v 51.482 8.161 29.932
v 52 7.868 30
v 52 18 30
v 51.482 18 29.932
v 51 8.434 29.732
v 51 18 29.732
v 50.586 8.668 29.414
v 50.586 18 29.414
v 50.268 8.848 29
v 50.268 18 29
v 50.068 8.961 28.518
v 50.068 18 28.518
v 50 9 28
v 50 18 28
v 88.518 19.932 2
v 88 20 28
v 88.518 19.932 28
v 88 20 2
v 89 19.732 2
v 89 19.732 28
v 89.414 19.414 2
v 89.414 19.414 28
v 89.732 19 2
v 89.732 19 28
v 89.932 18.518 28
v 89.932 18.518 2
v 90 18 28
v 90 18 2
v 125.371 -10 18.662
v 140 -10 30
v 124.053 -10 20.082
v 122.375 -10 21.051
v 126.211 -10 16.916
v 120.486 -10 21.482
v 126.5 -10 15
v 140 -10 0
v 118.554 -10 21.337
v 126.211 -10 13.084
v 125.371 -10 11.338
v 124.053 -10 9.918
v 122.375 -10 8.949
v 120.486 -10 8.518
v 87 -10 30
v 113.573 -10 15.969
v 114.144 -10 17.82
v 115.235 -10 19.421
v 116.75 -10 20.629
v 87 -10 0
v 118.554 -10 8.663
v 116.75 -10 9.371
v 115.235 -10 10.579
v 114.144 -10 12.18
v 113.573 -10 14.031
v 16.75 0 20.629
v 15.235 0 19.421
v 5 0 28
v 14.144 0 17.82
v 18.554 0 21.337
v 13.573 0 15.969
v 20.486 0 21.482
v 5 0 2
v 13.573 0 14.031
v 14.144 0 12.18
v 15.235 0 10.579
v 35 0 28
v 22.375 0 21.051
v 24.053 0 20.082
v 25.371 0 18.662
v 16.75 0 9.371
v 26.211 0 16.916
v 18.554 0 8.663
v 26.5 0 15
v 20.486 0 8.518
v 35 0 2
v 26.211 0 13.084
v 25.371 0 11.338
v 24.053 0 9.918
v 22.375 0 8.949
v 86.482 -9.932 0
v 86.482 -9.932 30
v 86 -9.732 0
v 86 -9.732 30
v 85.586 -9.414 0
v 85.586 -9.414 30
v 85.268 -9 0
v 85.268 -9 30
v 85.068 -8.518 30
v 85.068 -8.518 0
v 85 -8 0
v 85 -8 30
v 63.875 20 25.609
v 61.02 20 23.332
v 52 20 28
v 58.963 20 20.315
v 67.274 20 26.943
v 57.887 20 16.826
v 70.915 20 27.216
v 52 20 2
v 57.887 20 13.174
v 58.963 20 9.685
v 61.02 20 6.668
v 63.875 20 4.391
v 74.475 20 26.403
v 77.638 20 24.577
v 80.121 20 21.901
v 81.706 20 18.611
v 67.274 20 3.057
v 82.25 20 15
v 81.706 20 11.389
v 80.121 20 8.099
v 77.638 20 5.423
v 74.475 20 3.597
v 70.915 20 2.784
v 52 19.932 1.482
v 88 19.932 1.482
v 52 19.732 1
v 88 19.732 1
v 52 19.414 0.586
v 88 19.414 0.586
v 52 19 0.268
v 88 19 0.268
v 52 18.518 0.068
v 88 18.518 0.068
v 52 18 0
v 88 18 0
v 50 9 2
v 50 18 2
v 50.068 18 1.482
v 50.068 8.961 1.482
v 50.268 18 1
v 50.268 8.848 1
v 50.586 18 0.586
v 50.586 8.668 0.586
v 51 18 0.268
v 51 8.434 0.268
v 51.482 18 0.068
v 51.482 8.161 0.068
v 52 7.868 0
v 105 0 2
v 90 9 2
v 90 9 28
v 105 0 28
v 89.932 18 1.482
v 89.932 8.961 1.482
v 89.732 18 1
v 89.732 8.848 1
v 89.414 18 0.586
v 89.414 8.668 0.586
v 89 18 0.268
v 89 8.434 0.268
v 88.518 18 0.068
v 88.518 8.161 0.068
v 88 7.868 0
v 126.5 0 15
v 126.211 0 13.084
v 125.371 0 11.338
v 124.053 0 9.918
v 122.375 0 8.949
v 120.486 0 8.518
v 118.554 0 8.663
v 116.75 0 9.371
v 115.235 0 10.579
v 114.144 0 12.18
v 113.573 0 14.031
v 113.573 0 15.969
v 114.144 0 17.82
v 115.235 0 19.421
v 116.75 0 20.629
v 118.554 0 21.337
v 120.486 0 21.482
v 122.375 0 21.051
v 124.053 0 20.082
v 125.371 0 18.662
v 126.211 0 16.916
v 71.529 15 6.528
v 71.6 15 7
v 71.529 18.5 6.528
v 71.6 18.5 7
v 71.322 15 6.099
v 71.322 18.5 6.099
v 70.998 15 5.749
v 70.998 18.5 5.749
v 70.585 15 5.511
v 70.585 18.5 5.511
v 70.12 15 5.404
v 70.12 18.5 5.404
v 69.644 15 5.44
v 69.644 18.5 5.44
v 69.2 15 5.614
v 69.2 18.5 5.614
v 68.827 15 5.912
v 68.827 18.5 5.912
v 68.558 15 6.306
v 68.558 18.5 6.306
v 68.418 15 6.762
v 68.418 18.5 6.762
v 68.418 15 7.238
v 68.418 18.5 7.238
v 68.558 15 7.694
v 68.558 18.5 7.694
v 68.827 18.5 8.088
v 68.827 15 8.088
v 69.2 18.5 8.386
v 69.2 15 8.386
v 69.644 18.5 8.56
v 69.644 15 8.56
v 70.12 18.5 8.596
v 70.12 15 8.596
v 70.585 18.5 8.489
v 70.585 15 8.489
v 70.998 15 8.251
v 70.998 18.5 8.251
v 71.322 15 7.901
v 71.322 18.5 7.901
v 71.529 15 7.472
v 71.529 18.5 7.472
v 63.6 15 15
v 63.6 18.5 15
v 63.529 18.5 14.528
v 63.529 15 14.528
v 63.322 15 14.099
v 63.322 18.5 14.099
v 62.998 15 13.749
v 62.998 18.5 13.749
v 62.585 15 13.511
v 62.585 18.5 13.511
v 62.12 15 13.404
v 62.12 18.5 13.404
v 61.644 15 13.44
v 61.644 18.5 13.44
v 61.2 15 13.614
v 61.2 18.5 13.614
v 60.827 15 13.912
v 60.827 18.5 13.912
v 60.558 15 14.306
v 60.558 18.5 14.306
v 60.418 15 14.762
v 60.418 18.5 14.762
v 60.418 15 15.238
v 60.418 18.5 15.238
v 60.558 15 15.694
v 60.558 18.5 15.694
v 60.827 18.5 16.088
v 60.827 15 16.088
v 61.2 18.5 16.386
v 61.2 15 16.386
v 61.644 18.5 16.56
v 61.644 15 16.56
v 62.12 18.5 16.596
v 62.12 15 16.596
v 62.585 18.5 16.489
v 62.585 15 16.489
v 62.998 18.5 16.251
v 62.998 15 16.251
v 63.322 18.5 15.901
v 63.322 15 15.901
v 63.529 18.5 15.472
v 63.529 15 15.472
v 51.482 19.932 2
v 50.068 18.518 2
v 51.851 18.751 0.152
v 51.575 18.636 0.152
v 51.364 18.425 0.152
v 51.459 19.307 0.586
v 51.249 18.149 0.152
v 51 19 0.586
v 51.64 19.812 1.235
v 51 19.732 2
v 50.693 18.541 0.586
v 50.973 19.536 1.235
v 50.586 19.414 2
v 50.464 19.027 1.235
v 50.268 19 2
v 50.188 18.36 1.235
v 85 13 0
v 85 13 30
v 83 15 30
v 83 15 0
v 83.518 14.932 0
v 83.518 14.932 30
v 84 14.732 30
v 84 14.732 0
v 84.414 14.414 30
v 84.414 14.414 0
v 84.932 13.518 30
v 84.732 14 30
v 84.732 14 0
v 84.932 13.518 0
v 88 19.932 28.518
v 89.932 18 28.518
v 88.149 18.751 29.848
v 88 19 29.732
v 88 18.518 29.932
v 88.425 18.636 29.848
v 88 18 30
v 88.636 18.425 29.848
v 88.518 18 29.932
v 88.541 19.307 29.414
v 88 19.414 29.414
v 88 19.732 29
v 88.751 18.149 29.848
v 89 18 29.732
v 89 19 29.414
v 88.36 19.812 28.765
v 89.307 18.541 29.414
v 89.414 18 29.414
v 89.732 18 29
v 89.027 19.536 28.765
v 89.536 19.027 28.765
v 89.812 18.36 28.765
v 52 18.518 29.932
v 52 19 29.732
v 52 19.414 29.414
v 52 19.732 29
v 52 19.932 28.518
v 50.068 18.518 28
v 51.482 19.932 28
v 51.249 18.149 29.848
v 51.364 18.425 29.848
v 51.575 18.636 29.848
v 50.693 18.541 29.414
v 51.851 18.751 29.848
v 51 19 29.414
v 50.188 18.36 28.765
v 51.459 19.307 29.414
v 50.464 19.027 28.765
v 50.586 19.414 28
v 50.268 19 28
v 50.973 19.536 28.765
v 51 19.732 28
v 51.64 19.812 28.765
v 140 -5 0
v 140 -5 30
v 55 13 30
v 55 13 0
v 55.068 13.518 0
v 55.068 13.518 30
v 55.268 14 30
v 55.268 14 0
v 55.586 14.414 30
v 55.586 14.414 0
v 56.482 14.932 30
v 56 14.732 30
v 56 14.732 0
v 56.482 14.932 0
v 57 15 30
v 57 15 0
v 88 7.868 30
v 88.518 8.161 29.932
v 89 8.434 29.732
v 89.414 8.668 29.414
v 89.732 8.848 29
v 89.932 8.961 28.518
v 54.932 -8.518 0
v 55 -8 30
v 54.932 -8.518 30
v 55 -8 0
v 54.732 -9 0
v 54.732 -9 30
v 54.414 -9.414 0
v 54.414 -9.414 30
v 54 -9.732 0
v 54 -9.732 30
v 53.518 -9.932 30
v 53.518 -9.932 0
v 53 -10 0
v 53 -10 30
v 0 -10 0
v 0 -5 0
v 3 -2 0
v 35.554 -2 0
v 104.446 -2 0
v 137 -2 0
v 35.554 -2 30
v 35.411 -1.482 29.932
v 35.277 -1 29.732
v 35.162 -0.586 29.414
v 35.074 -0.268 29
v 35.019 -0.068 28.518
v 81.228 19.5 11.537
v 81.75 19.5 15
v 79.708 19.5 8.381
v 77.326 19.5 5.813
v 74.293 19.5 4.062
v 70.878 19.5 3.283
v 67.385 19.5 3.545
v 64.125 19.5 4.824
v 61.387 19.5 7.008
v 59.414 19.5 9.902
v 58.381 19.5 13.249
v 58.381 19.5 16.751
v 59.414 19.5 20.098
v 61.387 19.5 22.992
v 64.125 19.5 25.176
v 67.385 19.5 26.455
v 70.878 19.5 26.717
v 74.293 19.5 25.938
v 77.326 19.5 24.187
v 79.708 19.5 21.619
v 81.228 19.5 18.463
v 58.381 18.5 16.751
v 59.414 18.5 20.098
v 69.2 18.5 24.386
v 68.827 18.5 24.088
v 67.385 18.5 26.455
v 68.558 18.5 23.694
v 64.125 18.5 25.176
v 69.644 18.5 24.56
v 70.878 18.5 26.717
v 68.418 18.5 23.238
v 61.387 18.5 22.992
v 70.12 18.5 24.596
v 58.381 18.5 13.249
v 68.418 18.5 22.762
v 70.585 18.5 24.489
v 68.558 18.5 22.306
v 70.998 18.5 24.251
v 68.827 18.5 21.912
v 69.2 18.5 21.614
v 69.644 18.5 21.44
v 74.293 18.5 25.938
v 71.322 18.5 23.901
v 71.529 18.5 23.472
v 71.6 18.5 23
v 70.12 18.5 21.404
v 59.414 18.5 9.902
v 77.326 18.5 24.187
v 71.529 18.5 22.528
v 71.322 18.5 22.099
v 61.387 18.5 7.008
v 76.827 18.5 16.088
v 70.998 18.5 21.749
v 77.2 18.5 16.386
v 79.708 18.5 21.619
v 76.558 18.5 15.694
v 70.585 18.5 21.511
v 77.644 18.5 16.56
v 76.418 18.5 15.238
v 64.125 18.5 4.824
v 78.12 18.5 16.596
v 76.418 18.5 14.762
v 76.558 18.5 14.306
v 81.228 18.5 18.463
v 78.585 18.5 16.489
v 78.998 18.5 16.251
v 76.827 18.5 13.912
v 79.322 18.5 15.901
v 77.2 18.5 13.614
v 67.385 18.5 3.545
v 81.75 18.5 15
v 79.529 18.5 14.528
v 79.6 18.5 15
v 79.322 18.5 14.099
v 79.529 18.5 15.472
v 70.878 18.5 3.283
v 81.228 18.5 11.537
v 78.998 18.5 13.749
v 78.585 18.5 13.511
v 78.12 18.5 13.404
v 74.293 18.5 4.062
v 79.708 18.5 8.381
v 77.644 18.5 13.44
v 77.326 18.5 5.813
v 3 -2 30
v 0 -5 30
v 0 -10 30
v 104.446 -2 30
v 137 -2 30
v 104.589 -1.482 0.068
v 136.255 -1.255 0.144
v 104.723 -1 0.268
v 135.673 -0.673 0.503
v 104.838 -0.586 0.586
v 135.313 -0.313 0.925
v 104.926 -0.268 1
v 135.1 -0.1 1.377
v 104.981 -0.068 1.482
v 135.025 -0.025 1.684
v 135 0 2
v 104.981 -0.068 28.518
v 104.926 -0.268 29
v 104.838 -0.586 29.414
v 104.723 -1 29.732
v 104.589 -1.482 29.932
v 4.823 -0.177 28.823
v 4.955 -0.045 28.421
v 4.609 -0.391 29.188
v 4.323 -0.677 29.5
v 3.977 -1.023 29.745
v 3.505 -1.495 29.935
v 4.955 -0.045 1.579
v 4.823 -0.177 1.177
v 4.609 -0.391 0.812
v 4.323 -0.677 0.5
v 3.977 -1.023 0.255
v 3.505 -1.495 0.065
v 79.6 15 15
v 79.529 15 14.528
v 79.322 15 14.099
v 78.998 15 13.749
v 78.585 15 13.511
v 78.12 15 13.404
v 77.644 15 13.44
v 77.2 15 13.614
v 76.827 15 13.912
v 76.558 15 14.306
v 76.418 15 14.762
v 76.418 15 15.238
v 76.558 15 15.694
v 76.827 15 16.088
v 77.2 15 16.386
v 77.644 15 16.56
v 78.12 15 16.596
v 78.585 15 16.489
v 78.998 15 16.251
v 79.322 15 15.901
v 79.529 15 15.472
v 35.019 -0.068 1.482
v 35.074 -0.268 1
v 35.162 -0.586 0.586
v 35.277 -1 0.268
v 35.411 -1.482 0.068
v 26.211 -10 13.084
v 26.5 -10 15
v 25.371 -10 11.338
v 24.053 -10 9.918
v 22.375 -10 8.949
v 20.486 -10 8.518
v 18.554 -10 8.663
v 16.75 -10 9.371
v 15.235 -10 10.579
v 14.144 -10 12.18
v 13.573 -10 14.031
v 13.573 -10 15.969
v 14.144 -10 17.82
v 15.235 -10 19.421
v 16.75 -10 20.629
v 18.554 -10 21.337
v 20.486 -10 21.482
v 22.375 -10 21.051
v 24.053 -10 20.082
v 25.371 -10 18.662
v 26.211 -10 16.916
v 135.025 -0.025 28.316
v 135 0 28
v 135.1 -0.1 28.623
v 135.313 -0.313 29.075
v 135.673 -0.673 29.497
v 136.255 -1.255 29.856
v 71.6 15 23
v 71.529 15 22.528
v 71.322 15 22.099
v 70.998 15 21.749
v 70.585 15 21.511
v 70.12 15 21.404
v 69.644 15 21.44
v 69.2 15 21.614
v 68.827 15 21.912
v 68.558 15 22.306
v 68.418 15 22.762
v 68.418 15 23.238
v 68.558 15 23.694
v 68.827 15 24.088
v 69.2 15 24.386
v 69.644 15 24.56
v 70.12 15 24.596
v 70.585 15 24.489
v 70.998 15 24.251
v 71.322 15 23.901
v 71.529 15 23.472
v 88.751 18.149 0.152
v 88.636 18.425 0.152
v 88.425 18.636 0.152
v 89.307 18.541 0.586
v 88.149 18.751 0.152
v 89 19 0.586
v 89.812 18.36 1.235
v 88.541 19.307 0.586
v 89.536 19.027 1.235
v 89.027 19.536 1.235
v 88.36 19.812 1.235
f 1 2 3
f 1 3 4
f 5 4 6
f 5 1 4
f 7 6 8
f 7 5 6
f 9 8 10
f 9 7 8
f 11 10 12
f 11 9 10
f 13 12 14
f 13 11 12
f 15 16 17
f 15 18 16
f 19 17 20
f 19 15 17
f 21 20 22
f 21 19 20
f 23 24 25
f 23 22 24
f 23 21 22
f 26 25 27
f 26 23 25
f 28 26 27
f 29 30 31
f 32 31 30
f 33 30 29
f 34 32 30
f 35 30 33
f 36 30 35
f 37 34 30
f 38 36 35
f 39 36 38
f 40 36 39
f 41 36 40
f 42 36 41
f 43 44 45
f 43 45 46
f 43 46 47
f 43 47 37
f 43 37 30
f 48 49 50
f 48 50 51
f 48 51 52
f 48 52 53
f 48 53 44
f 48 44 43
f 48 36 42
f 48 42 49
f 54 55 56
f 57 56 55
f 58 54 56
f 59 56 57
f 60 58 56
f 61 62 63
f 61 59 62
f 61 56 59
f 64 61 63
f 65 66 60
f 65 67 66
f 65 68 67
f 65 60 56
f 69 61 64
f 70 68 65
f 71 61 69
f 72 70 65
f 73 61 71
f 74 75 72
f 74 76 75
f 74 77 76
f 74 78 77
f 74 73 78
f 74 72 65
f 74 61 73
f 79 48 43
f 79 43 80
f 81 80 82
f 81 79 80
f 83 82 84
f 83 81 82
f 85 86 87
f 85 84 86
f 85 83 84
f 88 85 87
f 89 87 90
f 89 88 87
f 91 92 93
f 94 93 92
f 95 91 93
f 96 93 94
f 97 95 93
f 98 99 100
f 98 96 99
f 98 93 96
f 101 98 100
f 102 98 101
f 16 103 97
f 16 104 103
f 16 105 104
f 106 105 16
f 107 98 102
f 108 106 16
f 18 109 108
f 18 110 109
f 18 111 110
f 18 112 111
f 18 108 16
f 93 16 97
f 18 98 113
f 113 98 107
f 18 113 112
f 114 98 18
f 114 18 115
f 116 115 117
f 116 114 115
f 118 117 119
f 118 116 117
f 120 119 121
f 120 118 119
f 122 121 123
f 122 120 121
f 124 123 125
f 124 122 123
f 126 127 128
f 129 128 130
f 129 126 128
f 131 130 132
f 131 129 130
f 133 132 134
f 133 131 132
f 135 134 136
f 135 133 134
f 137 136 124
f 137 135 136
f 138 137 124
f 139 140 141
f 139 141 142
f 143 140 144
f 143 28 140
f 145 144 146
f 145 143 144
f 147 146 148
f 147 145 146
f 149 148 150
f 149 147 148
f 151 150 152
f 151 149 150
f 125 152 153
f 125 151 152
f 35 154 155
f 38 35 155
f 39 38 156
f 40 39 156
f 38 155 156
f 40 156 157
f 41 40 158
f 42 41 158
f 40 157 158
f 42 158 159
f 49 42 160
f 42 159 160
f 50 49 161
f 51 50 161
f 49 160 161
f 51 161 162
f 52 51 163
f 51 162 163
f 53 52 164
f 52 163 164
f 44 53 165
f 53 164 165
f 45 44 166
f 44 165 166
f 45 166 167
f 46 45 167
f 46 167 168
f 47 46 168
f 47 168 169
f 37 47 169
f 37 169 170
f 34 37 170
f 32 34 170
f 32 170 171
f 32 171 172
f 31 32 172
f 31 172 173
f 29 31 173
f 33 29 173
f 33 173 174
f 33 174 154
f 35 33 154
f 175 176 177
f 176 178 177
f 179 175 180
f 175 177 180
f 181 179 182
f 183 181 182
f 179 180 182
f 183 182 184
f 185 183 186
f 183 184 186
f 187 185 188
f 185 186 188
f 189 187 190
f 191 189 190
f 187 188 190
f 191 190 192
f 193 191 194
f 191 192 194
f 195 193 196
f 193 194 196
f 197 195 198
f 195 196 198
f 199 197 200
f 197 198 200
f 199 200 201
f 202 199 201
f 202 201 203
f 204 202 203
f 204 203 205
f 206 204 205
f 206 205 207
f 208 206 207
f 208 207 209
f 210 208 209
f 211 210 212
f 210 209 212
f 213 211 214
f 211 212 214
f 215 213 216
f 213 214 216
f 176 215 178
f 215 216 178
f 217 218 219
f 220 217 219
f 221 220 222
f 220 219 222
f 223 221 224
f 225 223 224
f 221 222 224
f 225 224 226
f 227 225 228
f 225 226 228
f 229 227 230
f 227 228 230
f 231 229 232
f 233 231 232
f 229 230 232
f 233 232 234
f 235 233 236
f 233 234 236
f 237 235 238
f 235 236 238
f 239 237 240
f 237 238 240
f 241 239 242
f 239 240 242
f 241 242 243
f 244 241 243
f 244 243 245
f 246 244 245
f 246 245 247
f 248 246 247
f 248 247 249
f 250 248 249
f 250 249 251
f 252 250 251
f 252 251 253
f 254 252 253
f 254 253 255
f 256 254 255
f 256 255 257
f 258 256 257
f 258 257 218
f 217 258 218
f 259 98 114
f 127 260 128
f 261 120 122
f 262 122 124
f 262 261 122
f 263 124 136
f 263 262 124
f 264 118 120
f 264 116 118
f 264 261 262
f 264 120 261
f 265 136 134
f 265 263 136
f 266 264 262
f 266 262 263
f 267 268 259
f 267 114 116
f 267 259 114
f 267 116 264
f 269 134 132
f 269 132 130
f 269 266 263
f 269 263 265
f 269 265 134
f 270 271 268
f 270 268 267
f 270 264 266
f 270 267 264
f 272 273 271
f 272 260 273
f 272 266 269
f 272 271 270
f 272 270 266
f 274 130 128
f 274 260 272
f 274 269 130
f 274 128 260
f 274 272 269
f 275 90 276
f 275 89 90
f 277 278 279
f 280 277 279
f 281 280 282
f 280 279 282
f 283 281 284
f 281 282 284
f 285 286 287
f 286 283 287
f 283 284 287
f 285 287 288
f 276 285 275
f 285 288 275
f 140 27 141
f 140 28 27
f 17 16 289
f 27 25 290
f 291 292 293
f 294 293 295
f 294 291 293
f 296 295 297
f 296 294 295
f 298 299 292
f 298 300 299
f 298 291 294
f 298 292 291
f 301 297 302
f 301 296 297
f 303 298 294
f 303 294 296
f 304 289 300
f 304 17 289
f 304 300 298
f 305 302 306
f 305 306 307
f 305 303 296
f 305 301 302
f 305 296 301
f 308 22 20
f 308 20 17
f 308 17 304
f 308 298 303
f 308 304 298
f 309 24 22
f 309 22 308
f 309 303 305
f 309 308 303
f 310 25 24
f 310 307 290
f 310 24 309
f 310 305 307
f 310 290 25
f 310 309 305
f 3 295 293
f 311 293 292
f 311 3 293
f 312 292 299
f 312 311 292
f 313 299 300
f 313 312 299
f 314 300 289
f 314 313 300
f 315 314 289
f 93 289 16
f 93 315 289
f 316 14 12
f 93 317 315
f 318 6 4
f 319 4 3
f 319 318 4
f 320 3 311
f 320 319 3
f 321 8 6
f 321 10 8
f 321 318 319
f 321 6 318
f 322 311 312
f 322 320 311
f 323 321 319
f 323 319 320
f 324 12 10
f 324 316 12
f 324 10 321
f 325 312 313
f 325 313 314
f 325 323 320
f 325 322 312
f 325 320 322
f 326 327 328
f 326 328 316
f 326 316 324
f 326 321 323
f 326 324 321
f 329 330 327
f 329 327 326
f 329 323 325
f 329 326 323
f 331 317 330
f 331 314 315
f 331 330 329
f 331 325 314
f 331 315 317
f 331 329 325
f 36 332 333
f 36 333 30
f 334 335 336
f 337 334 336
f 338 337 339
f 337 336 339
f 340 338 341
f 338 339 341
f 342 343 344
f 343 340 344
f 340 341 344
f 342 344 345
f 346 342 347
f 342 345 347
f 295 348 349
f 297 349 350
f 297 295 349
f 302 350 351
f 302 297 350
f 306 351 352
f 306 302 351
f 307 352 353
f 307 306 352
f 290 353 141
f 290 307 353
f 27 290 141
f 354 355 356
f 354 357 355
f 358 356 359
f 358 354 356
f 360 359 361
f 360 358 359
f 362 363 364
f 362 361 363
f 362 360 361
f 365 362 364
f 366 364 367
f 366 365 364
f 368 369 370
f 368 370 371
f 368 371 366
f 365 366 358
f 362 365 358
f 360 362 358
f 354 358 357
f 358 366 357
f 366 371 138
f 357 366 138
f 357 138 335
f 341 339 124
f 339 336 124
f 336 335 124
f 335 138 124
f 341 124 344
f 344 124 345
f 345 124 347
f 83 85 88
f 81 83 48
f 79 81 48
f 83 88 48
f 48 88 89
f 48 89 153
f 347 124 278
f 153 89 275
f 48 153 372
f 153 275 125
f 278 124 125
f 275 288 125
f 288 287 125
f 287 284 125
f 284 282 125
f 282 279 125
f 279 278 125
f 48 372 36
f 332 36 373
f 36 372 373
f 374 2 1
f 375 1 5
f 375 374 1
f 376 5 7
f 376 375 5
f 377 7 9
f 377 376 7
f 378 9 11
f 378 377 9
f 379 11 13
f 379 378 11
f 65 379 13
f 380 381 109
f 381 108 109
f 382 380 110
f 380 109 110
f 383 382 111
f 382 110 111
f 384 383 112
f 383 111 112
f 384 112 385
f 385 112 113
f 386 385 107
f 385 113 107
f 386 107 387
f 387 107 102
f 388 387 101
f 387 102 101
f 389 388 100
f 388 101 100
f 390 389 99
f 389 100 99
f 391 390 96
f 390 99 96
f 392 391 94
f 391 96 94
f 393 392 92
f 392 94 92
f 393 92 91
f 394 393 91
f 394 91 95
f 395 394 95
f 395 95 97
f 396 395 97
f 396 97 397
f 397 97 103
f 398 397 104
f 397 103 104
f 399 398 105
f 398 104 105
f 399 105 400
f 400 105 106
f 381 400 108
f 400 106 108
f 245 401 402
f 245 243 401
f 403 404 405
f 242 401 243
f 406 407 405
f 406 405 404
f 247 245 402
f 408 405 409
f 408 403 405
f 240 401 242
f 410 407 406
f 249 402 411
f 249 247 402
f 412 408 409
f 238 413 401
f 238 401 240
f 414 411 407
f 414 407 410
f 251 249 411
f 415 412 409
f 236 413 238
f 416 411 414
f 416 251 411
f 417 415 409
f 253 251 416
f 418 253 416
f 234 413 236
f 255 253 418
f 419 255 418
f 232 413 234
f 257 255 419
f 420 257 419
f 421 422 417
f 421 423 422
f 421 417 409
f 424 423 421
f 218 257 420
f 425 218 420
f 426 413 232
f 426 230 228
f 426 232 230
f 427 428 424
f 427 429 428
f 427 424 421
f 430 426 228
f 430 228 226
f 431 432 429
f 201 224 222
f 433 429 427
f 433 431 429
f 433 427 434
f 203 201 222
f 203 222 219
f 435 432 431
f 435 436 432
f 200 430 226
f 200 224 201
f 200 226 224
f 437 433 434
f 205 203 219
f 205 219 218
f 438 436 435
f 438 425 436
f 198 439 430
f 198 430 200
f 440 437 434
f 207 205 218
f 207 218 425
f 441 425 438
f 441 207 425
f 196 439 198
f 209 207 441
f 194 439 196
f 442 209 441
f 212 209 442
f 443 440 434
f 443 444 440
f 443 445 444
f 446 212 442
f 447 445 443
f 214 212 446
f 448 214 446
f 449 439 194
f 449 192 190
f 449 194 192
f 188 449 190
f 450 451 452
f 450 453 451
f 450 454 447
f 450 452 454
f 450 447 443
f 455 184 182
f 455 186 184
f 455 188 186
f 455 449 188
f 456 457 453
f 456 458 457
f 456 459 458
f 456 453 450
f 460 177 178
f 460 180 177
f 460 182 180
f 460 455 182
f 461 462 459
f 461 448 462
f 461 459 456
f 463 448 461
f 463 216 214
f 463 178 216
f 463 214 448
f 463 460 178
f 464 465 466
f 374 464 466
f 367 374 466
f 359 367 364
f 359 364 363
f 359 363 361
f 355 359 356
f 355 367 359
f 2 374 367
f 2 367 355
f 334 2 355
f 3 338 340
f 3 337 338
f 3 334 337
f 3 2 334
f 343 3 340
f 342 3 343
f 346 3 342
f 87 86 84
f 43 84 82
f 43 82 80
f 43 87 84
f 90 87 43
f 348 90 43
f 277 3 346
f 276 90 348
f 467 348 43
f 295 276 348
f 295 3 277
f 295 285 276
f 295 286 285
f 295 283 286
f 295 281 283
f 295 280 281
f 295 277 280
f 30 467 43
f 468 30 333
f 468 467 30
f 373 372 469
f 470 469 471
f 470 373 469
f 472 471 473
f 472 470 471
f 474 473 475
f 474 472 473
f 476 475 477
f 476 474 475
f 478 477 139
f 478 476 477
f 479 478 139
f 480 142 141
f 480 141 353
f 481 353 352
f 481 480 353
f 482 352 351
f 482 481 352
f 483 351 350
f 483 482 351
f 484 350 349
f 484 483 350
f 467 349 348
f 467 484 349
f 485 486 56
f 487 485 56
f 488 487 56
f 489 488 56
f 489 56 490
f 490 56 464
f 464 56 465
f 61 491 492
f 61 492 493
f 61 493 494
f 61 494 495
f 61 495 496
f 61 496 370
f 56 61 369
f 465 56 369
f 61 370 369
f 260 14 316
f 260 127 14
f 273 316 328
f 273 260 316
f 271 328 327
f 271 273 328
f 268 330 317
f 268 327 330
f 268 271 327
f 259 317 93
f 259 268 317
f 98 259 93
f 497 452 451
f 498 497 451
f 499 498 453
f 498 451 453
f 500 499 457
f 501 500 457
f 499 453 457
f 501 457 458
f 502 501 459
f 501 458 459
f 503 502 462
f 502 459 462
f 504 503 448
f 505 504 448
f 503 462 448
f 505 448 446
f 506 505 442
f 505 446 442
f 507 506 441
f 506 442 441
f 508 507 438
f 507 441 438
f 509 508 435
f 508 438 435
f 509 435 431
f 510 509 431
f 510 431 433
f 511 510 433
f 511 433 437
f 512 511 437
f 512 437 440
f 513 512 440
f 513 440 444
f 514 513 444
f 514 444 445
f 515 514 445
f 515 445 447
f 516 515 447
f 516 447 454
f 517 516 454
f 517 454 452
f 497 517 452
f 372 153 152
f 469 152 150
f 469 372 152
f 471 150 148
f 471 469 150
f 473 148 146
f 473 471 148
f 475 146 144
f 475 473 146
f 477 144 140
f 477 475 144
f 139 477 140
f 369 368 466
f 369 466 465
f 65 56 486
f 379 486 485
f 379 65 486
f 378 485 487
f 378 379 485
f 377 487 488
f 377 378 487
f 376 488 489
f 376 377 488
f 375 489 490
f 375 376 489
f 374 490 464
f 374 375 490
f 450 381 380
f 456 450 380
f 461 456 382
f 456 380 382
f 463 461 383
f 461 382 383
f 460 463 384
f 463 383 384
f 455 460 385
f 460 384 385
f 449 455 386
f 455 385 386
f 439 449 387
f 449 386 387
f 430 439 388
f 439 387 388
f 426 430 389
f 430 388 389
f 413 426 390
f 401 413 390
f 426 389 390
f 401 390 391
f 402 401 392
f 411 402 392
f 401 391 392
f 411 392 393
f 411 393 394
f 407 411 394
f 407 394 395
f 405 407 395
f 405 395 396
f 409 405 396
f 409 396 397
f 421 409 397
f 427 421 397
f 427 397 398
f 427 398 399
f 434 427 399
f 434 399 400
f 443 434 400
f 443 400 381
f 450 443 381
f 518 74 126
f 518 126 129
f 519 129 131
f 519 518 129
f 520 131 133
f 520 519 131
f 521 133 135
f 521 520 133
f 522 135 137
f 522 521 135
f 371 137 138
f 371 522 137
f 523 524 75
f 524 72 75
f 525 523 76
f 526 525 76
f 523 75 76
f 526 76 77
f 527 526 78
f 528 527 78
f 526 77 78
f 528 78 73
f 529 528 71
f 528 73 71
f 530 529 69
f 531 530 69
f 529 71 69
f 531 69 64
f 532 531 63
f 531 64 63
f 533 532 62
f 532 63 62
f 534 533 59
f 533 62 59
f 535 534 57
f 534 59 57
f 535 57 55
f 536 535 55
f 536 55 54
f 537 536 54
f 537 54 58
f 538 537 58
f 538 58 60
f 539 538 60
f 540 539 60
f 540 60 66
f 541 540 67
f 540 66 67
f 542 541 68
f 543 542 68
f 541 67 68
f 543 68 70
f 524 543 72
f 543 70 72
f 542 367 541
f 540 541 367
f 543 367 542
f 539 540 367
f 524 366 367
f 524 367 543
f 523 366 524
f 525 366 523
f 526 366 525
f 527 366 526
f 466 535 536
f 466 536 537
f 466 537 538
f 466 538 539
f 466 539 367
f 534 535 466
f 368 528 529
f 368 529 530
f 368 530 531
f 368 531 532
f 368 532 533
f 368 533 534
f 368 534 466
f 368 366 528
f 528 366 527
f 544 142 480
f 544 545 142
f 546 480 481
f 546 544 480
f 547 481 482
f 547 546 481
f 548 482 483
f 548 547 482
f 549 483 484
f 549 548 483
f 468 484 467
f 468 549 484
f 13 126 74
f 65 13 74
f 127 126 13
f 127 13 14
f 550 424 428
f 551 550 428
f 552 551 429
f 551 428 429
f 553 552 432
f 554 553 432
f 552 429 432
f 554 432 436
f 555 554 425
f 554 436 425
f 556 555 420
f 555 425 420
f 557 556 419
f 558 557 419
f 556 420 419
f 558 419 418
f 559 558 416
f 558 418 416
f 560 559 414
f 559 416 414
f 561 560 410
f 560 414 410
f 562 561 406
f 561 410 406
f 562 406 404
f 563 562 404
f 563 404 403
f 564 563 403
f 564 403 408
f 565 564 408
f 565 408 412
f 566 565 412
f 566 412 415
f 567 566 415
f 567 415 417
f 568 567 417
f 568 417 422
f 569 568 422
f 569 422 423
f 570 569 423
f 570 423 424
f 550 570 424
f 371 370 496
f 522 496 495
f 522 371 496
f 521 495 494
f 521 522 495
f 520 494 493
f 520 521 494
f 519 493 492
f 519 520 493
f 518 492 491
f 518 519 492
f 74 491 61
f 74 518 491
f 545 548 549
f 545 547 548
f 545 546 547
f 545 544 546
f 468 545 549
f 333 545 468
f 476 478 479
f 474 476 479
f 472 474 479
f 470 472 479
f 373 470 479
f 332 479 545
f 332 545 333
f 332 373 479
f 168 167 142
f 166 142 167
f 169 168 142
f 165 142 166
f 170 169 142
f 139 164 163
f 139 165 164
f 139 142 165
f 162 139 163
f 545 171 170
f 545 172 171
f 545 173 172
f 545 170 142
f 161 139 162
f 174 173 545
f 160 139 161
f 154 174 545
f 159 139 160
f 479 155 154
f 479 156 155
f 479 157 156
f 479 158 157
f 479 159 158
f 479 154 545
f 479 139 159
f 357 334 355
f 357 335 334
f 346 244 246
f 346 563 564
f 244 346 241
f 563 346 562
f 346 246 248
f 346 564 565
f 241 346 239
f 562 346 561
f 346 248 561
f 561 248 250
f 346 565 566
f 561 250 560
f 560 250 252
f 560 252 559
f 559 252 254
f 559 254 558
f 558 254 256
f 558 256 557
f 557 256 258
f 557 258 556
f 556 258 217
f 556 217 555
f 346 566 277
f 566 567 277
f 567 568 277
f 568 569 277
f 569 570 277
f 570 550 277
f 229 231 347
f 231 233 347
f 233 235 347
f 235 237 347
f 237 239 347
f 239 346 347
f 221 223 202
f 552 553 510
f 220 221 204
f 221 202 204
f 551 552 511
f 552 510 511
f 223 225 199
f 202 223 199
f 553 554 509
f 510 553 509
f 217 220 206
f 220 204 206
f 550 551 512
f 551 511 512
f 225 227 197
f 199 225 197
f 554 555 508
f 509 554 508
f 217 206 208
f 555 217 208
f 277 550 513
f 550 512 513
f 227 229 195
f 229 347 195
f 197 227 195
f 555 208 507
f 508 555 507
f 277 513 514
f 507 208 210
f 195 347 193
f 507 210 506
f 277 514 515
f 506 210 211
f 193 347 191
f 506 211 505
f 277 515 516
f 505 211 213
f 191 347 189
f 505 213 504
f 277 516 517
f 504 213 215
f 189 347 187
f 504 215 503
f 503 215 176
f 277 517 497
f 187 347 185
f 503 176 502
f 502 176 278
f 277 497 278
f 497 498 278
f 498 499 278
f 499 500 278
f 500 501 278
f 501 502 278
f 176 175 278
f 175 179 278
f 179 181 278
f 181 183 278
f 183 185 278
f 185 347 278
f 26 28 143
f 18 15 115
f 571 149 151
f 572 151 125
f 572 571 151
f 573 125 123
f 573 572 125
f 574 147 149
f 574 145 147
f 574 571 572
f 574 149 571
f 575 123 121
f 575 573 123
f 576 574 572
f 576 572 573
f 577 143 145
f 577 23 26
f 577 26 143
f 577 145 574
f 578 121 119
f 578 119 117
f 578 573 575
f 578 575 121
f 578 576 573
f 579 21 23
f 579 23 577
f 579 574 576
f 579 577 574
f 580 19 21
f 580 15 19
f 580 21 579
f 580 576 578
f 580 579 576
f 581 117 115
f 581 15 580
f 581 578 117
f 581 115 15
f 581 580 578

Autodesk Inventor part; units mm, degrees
ref_plane "YZ Plane" through (0, 0, 0) normal (1, 0, 0) x (0, 1, 0)
ref_plane "XZ Plane" through (0, 0, 0) normal (0, 1, 0) x (-1, 0, 0)
ref_plane "XY Plane" through (0, 0, 0) normal (0, 0, 1) x (1, 0, 0)
sketch "Sketch1" plane through (0, 0, 0) normal (0, 0, 1) x (1, 0, 0)
  line L0 (5, 0) -> (50, 0)
  line L1 (50, 0) -> (50, 18)
  line L2 (52, 20) -> (88, 20)
  line L3 (90, 18) -> (90, 0)
  line L4 (105, 0) -> (135, 0)
  line L5 (140, -5) -> (140, -10)
  line L6 (140, -10) -> (87, -10)
  line L7 (53, -10) -> (0, -10)
  line L8 (0, -10) -> (0, -5)
  line L9 (57, 15) -> (83, 15)
  line L10 (55, 13) -> (55, -8)
  line L11 (85, -8) -> (85, 13)
  arc A0 (52, 20) -> (50, 18) centre (52, 18) ccw
  arc A1 (90, 18) -> (88, 20) centre (88, 18) ccw
  line L12 (50, 9) -> (35, 0)
  line L13 (90, 0) -> (90, 9)
  line L14 (90, 9) -> (105, 0)
  arc A2 (57, 15) -> (55, 13) centre (57, 13) ccw
  arc A3 (85, 13) -> (83, 15) centre (83, 13) ccw
  arc A4 (53, -10) -> (55, -8) centre (53, -8) ccw
  arc A5 (85, -8) -> (87, -10) centre (87, -8) ccw
  line L15 (5, 0) -> (0, -5)
  line L16 (135, 0) -> (140, -5)
  point P0 (0, 0)
  point P1 (50, 20)
  point P2 (90, 20)
  point P3 (140, 0)
  point P4 (140, 0)
  point P5 (0, 0)
  point P6 (140, 0)
  dimension "d0" = 50
  dimension "d1" = 20
  dimension "d2" = 40
  dimension "d3" = 50
  dimension "d4" = 10
  dimension "d7" = 10
  dimension "d8" = 5
  dimension "d9" = 2
  dimension "d10" = 15
  dimension "d11" = 9
  dimension "d12" = 15
  dimension "d13" = 2
  dimension "d14" = 30
  dimension "d15" = 2
  dimension "d18" = 5
  dimension "d19" = 5
  dimension "d20" = 5
  dimension "d21" = 5
extrude "Extrusion1" add sketch "Sketch1" along normal blind 30
sketch "Sketch2" plane through (105, 0, 0) normal (0, 1, 0) x (1, 0, 0)
  circle A0 centre (15, -15) radius 6.5
  line L0 (30, 0) -> (0, 0) projected
  line L1 (0, 0) -> (0, -30) projected
  circle A1 centre (-84.9999, -15) radius 6.5
  line L2 (-100, 0) -> (-100, -30) projected
  line L3 (-70, 0) -> (-100, 0) projected
  point P0 (-105, 0)
  point P1 (0, -15)
  dimension "d24" = 13
  dimension "d25" = 15
  dimension "d26" = 15
  dimension "d27" = 13
  dimension "d28" = 15
  dimension "d29" = 15
extrude "Extrusion2" cut sketch "Sketch2" against normal blind 30
sketch "Sketch3" plane through (0, 0, 30) normal (0, 0, 1) x (1, 0, 0)
  point P0 (0, 0)
sketch "Sketch4" plane through (52, 20, 0) normal (0, 1, 0) x (1, 0, 0)
  circle A0 centre (18, -15) radius 11.75
  line L0 (38, 0) -> (38, -30) projected
  line L1 (36, 0) -> (0, 0) projected
  circle A1 centre (18, -7) radius 1.6
  circle A2 centre (10, -15) radius 1.6
  circle A3 centre (18, -23) radius 1.6
  circle A4 centre (26, -15) radius 1.6
  point P0 (-52, 0)
  dimension "d32" = 23.5
  dimension "d33" = 20
  dimension "d34" = 15
  dimension "d35" = 3.2
  dimension "d36" = 8
  dimension "d39" = 360
extrude "Extrusion3" cut sketch "Sketch4" against normal blind 1.5
extrude "Extrusion4" cut sketch "Sketch4" against normal blind 30 contours A1 | A2 | A3 | A4
fillet "Fillet1" radius 2 18 edges at (50.5858, 19.4142, 0) (50, 13.5, 0) (89.4142, 19.4142, 0) (90, 13.5, 0) (70, 20, 0) (50.5858, 19.4142, 30) (50, 13.5, 30) (89.4142, 19.4142, 30) (90, 13.5, 30) (70, 20, 30) (97.5, 4.5, 30) (120, 0, 30) (97.5, 4.5, 0) (120, 0, 0) (42.5, 4.5, 30) (20, 0, 30) (20, 0, 0) (42.5, 4.5, 0)
chamfer "Chamfer1" distance 0.5 angle 45 1 edges at (58.25, 20, 15)
sketch "Sketch5" plane through (105, 0, 28) normal (0, 1, 0) x (1, 0, 0)
  point P0 (-105, 28)
equation "\"d19\" = d18"
equation "\"d20\" = d18"
equation "\"d21\" = d20"
equation "\"BendRadius\" = Thickness"
equation "\"BendReliefWidth\" = Thickness"
equation "\"BendReliefDepth\" = 0.5 * Thickness"
equation "\"CornerReliefSize\" = 4 * Thickness"
equation "\"MinimumRemnant\" = 2 * Thickness"
equation "\"TransitionRadius\" = BendRadius"
equation "\"JacobiRadiusSize\" = BendRadius"
equation "\"GapSize\" = Thickness"
equation "\"Thickness\" = 0.5"
properties part number "4_DOF_2"
